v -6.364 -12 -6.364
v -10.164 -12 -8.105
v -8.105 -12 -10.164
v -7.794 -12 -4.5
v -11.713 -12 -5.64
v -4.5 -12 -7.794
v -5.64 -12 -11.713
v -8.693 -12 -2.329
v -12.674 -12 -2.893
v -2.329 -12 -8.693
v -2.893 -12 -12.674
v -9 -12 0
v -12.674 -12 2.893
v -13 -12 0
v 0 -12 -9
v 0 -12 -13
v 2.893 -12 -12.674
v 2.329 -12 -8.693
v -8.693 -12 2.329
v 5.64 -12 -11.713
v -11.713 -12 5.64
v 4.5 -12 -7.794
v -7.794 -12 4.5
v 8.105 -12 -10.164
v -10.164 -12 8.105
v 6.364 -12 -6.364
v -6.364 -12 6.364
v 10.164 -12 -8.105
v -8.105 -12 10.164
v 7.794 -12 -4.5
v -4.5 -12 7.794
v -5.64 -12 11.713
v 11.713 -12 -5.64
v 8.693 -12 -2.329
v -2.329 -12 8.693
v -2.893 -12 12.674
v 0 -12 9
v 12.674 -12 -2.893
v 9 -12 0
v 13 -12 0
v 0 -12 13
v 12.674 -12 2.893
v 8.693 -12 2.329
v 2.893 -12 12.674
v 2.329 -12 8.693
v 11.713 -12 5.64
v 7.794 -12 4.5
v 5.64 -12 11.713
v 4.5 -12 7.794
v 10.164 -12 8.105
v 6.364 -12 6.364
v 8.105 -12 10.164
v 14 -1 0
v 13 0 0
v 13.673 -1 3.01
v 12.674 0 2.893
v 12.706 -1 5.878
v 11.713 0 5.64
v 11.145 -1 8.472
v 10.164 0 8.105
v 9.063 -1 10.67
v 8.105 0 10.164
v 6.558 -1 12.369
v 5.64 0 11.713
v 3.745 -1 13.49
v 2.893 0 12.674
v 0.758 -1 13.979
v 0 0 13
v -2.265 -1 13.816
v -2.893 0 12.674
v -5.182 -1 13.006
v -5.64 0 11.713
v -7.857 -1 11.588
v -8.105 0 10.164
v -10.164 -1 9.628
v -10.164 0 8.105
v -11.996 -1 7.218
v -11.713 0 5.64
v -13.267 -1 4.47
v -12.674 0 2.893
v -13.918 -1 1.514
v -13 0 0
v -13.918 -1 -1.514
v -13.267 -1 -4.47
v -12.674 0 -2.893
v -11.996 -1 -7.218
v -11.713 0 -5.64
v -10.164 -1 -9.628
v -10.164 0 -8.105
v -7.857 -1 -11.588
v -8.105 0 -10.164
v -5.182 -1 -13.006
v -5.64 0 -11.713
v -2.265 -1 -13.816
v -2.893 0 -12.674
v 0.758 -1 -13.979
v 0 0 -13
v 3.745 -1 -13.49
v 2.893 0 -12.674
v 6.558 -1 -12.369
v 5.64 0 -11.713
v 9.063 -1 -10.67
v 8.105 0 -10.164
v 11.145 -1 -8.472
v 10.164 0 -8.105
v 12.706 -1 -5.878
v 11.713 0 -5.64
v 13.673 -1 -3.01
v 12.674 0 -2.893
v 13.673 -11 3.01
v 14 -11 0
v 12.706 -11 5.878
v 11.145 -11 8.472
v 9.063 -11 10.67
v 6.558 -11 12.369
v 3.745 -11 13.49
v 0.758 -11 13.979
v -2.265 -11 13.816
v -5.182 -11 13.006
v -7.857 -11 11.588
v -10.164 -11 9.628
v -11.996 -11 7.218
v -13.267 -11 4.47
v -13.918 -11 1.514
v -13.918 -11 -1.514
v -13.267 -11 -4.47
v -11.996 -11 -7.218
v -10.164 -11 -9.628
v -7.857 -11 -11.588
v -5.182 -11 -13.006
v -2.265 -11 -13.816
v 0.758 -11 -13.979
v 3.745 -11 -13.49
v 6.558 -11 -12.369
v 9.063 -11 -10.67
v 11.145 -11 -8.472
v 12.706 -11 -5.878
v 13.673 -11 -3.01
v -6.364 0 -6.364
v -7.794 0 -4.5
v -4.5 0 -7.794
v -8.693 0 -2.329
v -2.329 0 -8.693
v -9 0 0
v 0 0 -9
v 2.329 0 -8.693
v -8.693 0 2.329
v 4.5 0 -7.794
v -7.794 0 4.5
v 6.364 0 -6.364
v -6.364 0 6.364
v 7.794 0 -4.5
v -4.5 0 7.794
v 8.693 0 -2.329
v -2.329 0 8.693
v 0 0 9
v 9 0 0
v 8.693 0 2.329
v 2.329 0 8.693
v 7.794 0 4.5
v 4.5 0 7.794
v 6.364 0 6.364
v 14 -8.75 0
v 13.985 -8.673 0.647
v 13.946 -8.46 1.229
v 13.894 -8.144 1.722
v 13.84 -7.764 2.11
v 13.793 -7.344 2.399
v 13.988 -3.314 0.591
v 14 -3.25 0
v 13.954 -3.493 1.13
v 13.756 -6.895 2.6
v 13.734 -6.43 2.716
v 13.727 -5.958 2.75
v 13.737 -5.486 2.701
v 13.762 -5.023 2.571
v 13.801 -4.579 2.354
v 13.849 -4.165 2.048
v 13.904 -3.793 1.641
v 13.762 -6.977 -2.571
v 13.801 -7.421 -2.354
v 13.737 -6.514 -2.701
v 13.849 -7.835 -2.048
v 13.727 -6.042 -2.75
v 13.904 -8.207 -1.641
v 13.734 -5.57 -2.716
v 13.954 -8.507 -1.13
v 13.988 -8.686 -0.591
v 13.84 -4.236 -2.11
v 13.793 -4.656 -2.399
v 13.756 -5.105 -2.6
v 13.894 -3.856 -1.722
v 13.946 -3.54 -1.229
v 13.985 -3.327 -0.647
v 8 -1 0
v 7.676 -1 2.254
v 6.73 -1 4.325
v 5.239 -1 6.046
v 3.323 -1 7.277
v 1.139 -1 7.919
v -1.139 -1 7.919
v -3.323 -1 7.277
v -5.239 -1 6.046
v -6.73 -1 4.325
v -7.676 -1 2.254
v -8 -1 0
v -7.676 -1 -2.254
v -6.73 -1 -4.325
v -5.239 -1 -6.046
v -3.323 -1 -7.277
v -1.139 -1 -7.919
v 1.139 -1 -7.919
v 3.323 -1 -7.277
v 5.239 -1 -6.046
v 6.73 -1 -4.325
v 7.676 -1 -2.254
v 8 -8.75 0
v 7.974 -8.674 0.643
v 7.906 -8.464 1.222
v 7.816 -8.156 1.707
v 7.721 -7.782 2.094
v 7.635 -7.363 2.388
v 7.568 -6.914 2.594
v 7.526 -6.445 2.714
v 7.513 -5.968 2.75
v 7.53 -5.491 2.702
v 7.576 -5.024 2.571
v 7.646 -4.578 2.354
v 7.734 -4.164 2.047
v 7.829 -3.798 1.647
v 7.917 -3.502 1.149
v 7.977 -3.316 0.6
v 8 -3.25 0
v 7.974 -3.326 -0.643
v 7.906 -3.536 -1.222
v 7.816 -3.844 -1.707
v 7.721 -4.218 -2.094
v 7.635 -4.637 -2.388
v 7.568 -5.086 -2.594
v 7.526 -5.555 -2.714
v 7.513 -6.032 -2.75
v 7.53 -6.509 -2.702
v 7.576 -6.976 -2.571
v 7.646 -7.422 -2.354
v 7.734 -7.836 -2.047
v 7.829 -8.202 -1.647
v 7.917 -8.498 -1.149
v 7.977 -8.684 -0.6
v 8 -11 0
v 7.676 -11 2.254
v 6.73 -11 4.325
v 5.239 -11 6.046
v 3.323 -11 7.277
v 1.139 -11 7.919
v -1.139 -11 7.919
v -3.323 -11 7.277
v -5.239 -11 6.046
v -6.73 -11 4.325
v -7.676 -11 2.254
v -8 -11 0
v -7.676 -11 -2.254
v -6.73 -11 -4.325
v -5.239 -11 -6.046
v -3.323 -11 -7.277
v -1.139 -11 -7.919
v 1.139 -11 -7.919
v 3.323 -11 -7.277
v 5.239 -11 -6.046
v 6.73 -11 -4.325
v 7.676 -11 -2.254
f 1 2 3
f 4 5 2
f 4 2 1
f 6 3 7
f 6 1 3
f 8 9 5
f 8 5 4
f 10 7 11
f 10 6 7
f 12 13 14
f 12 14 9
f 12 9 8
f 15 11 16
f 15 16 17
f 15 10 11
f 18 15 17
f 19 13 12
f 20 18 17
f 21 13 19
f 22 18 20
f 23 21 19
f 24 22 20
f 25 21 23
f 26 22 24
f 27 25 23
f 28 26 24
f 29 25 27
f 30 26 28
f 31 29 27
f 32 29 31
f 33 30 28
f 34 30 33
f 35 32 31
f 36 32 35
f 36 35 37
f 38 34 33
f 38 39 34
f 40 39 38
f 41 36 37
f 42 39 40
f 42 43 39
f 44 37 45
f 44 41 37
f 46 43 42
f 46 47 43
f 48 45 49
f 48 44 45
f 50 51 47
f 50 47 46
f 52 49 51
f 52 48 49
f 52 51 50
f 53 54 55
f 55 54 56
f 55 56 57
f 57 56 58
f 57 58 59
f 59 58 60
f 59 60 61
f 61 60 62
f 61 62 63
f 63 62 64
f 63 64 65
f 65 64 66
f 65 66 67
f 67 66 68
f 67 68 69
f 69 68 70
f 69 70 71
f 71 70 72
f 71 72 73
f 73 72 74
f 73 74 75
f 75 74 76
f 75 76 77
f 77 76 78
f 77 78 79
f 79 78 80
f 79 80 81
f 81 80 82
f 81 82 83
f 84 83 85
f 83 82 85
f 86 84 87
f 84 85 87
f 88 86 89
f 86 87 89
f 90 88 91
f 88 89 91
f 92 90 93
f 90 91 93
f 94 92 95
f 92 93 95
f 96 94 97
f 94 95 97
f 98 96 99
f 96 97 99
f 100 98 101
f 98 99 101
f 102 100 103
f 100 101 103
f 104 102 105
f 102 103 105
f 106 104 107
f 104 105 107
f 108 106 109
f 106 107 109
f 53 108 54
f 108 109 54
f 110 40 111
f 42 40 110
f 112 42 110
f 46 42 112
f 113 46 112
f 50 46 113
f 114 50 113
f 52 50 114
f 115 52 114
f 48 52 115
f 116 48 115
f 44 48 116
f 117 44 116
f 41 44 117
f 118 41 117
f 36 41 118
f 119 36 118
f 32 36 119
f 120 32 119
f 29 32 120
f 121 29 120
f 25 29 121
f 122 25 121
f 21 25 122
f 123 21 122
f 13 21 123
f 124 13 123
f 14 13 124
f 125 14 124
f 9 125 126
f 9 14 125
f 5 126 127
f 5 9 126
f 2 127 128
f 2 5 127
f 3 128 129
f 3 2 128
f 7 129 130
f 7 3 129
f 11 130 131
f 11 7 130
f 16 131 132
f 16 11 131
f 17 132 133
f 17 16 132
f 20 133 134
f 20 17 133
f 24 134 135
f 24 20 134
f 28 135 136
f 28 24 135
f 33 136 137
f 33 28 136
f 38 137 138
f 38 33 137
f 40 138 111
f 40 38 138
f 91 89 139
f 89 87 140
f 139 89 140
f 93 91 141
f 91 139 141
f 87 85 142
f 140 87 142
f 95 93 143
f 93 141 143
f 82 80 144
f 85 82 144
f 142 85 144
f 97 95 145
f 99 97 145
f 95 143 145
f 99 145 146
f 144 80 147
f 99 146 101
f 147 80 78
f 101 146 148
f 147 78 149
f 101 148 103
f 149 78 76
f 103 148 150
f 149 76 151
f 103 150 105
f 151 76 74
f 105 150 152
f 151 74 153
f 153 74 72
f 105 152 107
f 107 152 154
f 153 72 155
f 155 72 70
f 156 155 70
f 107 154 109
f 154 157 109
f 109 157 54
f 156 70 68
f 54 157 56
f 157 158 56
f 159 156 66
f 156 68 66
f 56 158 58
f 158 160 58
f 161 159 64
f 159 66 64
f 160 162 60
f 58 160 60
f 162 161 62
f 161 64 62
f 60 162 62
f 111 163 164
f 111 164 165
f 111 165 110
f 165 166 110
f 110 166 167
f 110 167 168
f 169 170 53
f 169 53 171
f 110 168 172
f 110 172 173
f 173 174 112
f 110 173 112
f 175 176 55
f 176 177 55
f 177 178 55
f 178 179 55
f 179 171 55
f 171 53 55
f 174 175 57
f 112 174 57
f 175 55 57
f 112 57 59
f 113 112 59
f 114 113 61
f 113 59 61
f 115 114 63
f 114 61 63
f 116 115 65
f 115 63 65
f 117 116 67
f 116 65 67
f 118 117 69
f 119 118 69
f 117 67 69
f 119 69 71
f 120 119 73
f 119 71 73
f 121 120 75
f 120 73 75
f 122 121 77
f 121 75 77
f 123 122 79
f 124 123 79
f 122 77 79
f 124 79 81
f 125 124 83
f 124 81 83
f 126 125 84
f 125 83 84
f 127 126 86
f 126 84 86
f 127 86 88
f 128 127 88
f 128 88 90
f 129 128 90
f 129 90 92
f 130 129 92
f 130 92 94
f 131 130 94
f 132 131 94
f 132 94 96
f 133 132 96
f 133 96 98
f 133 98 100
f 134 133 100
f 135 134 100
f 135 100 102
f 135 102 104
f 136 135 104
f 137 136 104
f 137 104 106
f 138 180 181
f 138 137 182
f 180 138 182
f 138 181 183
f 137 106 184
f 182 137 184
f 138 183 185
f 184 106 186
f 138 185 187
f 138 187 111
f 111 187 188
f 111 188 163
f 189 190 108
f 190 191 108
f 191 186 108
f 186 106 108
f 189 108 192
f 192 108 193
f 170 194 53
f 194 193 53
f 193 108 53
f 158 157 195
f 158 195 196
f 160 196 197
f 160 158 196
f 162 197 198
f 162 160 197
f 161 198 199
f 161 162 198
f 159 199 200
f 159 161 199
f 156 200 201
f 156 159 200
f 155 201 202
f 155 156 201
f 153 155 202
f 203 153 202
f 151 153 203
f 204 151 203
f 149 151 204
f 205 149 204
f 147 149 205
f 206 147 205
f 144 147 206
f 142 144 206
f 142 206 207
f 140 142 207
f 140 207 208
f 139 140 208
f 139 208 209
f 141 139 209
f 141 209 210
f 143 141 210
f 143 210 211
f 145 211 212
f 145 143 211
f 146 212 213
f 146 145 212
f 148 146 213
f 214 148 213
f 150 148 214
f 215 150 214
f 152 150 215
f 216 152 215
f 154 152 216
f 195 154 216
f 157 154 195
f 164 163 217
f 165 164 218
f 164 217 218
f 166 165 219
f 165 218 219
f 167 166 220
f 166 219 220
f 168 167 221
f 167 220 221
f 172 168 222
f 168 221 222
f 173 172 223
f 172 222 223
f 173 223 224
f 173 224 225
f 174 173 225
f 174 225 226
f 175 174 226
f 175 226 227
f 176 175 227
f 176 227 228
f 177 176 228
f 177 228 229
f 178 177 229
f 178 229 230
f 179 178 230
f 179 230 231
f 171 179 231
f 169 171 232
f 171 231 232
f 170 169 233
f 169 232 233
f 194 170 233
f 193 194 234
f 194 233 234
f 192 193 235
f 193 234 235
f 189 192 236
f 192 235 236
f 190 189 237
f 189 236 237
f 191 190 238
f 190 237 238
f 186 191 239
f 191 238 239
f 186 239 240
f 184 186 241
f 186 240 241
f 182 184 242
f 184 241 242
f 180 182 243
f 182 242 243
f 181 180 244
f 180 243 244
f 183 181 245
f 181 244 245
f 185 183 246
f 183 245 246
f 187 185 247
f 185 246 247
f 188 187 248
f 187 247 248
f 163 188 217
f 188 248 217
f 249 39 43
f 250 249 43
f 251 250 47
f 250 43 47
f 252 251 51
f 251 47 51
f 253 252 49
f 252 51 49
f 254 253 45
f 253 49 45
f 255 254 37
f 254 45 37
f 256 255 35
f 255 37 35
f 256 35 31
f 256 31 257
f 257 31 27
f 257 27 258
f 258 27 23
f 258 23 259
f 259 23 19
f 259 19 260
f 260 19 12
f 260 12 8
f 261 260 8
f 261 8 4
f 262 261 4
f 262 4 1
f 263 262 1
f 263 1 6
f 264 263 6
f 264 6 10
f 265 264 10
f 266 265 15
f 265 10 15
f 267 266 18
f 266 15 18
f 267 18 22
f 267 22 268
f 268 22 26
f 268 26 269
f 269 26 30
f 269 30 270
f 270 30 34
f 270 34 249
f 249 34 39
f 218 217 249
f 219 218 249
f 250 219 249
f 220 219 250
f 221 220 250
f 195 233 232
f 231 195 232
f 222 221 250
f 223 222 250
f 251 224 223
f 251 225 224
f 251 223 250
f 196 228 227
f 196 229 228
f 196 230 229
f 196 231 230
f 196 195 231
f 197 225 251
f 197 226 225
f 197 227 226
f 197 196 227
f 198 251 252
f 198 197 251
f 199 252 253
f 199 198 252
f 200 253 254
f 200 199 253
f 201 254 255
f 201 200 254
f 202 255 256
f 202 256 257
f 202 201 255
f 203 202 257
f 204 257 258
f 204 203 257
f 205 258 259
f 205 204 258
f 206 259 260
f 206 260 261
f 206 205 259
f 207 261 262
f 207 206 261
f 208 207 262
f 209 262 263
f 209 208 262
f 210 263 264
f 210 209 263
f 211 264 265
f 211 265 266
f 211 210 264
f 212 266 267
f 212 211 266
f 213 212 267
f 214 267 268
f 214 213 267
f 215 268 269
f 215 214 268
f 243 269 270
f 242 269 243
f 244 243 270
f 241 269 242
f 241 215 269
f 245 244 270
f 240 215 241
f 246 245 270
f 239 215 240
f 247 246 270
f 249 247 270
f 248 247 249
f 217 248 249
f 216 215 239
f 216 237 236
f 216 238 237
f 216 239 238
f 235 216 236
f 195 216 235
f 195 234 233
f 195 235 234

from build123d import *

# Parameters (mm, degrees)
F1_R     = 14
F1_R_2   = 8
F2_DEPTH = 12
F3_SIZE  = 1
F7_D     = 5.5
F7_DEPTH = 14.4
F7_START = 0.2727462
F7_TIP   = 1.6523667023


with BuildPart() as f2:
    # F1 (on Front) → F2 (new body)
    with BuildSketch(Plane.XZ):
        Circle(F1_R)
        Circle(F1_R_2, mode=Mode.SUBTRACT)
    extrude(amount=F2_DEPTH)

    # F3
    f3_edges = [f2.edges().sort_by_distance(p)[0] for p in [
        (14, -6, 0),
        (-14, 0, 0),
        (-14, -12, 0),
        (8, -6, 0),
        (-8, 0, 0),
        (-8, -12, 0),
    ]]
    chamfer(f3_edges, length=F3_SIZE)

    # F7
    # its depths count from where the whole tool has entered the part; down to there all is cleared
    with Locations(Plane.YZ.offset(14).offset(-F7_START)):
        with Locations((-6, 0)):
            Hole(F7_D / 2, depth=F7_DEPTH)
            with Locations((0, 0, -(F7_DEPTH + F7_TIP / 2))):  # 118° drill point
                Cone(0, F7_D / 2, F7_TIP, mode=Mode.SUBTRACT)


solid = f2.part
